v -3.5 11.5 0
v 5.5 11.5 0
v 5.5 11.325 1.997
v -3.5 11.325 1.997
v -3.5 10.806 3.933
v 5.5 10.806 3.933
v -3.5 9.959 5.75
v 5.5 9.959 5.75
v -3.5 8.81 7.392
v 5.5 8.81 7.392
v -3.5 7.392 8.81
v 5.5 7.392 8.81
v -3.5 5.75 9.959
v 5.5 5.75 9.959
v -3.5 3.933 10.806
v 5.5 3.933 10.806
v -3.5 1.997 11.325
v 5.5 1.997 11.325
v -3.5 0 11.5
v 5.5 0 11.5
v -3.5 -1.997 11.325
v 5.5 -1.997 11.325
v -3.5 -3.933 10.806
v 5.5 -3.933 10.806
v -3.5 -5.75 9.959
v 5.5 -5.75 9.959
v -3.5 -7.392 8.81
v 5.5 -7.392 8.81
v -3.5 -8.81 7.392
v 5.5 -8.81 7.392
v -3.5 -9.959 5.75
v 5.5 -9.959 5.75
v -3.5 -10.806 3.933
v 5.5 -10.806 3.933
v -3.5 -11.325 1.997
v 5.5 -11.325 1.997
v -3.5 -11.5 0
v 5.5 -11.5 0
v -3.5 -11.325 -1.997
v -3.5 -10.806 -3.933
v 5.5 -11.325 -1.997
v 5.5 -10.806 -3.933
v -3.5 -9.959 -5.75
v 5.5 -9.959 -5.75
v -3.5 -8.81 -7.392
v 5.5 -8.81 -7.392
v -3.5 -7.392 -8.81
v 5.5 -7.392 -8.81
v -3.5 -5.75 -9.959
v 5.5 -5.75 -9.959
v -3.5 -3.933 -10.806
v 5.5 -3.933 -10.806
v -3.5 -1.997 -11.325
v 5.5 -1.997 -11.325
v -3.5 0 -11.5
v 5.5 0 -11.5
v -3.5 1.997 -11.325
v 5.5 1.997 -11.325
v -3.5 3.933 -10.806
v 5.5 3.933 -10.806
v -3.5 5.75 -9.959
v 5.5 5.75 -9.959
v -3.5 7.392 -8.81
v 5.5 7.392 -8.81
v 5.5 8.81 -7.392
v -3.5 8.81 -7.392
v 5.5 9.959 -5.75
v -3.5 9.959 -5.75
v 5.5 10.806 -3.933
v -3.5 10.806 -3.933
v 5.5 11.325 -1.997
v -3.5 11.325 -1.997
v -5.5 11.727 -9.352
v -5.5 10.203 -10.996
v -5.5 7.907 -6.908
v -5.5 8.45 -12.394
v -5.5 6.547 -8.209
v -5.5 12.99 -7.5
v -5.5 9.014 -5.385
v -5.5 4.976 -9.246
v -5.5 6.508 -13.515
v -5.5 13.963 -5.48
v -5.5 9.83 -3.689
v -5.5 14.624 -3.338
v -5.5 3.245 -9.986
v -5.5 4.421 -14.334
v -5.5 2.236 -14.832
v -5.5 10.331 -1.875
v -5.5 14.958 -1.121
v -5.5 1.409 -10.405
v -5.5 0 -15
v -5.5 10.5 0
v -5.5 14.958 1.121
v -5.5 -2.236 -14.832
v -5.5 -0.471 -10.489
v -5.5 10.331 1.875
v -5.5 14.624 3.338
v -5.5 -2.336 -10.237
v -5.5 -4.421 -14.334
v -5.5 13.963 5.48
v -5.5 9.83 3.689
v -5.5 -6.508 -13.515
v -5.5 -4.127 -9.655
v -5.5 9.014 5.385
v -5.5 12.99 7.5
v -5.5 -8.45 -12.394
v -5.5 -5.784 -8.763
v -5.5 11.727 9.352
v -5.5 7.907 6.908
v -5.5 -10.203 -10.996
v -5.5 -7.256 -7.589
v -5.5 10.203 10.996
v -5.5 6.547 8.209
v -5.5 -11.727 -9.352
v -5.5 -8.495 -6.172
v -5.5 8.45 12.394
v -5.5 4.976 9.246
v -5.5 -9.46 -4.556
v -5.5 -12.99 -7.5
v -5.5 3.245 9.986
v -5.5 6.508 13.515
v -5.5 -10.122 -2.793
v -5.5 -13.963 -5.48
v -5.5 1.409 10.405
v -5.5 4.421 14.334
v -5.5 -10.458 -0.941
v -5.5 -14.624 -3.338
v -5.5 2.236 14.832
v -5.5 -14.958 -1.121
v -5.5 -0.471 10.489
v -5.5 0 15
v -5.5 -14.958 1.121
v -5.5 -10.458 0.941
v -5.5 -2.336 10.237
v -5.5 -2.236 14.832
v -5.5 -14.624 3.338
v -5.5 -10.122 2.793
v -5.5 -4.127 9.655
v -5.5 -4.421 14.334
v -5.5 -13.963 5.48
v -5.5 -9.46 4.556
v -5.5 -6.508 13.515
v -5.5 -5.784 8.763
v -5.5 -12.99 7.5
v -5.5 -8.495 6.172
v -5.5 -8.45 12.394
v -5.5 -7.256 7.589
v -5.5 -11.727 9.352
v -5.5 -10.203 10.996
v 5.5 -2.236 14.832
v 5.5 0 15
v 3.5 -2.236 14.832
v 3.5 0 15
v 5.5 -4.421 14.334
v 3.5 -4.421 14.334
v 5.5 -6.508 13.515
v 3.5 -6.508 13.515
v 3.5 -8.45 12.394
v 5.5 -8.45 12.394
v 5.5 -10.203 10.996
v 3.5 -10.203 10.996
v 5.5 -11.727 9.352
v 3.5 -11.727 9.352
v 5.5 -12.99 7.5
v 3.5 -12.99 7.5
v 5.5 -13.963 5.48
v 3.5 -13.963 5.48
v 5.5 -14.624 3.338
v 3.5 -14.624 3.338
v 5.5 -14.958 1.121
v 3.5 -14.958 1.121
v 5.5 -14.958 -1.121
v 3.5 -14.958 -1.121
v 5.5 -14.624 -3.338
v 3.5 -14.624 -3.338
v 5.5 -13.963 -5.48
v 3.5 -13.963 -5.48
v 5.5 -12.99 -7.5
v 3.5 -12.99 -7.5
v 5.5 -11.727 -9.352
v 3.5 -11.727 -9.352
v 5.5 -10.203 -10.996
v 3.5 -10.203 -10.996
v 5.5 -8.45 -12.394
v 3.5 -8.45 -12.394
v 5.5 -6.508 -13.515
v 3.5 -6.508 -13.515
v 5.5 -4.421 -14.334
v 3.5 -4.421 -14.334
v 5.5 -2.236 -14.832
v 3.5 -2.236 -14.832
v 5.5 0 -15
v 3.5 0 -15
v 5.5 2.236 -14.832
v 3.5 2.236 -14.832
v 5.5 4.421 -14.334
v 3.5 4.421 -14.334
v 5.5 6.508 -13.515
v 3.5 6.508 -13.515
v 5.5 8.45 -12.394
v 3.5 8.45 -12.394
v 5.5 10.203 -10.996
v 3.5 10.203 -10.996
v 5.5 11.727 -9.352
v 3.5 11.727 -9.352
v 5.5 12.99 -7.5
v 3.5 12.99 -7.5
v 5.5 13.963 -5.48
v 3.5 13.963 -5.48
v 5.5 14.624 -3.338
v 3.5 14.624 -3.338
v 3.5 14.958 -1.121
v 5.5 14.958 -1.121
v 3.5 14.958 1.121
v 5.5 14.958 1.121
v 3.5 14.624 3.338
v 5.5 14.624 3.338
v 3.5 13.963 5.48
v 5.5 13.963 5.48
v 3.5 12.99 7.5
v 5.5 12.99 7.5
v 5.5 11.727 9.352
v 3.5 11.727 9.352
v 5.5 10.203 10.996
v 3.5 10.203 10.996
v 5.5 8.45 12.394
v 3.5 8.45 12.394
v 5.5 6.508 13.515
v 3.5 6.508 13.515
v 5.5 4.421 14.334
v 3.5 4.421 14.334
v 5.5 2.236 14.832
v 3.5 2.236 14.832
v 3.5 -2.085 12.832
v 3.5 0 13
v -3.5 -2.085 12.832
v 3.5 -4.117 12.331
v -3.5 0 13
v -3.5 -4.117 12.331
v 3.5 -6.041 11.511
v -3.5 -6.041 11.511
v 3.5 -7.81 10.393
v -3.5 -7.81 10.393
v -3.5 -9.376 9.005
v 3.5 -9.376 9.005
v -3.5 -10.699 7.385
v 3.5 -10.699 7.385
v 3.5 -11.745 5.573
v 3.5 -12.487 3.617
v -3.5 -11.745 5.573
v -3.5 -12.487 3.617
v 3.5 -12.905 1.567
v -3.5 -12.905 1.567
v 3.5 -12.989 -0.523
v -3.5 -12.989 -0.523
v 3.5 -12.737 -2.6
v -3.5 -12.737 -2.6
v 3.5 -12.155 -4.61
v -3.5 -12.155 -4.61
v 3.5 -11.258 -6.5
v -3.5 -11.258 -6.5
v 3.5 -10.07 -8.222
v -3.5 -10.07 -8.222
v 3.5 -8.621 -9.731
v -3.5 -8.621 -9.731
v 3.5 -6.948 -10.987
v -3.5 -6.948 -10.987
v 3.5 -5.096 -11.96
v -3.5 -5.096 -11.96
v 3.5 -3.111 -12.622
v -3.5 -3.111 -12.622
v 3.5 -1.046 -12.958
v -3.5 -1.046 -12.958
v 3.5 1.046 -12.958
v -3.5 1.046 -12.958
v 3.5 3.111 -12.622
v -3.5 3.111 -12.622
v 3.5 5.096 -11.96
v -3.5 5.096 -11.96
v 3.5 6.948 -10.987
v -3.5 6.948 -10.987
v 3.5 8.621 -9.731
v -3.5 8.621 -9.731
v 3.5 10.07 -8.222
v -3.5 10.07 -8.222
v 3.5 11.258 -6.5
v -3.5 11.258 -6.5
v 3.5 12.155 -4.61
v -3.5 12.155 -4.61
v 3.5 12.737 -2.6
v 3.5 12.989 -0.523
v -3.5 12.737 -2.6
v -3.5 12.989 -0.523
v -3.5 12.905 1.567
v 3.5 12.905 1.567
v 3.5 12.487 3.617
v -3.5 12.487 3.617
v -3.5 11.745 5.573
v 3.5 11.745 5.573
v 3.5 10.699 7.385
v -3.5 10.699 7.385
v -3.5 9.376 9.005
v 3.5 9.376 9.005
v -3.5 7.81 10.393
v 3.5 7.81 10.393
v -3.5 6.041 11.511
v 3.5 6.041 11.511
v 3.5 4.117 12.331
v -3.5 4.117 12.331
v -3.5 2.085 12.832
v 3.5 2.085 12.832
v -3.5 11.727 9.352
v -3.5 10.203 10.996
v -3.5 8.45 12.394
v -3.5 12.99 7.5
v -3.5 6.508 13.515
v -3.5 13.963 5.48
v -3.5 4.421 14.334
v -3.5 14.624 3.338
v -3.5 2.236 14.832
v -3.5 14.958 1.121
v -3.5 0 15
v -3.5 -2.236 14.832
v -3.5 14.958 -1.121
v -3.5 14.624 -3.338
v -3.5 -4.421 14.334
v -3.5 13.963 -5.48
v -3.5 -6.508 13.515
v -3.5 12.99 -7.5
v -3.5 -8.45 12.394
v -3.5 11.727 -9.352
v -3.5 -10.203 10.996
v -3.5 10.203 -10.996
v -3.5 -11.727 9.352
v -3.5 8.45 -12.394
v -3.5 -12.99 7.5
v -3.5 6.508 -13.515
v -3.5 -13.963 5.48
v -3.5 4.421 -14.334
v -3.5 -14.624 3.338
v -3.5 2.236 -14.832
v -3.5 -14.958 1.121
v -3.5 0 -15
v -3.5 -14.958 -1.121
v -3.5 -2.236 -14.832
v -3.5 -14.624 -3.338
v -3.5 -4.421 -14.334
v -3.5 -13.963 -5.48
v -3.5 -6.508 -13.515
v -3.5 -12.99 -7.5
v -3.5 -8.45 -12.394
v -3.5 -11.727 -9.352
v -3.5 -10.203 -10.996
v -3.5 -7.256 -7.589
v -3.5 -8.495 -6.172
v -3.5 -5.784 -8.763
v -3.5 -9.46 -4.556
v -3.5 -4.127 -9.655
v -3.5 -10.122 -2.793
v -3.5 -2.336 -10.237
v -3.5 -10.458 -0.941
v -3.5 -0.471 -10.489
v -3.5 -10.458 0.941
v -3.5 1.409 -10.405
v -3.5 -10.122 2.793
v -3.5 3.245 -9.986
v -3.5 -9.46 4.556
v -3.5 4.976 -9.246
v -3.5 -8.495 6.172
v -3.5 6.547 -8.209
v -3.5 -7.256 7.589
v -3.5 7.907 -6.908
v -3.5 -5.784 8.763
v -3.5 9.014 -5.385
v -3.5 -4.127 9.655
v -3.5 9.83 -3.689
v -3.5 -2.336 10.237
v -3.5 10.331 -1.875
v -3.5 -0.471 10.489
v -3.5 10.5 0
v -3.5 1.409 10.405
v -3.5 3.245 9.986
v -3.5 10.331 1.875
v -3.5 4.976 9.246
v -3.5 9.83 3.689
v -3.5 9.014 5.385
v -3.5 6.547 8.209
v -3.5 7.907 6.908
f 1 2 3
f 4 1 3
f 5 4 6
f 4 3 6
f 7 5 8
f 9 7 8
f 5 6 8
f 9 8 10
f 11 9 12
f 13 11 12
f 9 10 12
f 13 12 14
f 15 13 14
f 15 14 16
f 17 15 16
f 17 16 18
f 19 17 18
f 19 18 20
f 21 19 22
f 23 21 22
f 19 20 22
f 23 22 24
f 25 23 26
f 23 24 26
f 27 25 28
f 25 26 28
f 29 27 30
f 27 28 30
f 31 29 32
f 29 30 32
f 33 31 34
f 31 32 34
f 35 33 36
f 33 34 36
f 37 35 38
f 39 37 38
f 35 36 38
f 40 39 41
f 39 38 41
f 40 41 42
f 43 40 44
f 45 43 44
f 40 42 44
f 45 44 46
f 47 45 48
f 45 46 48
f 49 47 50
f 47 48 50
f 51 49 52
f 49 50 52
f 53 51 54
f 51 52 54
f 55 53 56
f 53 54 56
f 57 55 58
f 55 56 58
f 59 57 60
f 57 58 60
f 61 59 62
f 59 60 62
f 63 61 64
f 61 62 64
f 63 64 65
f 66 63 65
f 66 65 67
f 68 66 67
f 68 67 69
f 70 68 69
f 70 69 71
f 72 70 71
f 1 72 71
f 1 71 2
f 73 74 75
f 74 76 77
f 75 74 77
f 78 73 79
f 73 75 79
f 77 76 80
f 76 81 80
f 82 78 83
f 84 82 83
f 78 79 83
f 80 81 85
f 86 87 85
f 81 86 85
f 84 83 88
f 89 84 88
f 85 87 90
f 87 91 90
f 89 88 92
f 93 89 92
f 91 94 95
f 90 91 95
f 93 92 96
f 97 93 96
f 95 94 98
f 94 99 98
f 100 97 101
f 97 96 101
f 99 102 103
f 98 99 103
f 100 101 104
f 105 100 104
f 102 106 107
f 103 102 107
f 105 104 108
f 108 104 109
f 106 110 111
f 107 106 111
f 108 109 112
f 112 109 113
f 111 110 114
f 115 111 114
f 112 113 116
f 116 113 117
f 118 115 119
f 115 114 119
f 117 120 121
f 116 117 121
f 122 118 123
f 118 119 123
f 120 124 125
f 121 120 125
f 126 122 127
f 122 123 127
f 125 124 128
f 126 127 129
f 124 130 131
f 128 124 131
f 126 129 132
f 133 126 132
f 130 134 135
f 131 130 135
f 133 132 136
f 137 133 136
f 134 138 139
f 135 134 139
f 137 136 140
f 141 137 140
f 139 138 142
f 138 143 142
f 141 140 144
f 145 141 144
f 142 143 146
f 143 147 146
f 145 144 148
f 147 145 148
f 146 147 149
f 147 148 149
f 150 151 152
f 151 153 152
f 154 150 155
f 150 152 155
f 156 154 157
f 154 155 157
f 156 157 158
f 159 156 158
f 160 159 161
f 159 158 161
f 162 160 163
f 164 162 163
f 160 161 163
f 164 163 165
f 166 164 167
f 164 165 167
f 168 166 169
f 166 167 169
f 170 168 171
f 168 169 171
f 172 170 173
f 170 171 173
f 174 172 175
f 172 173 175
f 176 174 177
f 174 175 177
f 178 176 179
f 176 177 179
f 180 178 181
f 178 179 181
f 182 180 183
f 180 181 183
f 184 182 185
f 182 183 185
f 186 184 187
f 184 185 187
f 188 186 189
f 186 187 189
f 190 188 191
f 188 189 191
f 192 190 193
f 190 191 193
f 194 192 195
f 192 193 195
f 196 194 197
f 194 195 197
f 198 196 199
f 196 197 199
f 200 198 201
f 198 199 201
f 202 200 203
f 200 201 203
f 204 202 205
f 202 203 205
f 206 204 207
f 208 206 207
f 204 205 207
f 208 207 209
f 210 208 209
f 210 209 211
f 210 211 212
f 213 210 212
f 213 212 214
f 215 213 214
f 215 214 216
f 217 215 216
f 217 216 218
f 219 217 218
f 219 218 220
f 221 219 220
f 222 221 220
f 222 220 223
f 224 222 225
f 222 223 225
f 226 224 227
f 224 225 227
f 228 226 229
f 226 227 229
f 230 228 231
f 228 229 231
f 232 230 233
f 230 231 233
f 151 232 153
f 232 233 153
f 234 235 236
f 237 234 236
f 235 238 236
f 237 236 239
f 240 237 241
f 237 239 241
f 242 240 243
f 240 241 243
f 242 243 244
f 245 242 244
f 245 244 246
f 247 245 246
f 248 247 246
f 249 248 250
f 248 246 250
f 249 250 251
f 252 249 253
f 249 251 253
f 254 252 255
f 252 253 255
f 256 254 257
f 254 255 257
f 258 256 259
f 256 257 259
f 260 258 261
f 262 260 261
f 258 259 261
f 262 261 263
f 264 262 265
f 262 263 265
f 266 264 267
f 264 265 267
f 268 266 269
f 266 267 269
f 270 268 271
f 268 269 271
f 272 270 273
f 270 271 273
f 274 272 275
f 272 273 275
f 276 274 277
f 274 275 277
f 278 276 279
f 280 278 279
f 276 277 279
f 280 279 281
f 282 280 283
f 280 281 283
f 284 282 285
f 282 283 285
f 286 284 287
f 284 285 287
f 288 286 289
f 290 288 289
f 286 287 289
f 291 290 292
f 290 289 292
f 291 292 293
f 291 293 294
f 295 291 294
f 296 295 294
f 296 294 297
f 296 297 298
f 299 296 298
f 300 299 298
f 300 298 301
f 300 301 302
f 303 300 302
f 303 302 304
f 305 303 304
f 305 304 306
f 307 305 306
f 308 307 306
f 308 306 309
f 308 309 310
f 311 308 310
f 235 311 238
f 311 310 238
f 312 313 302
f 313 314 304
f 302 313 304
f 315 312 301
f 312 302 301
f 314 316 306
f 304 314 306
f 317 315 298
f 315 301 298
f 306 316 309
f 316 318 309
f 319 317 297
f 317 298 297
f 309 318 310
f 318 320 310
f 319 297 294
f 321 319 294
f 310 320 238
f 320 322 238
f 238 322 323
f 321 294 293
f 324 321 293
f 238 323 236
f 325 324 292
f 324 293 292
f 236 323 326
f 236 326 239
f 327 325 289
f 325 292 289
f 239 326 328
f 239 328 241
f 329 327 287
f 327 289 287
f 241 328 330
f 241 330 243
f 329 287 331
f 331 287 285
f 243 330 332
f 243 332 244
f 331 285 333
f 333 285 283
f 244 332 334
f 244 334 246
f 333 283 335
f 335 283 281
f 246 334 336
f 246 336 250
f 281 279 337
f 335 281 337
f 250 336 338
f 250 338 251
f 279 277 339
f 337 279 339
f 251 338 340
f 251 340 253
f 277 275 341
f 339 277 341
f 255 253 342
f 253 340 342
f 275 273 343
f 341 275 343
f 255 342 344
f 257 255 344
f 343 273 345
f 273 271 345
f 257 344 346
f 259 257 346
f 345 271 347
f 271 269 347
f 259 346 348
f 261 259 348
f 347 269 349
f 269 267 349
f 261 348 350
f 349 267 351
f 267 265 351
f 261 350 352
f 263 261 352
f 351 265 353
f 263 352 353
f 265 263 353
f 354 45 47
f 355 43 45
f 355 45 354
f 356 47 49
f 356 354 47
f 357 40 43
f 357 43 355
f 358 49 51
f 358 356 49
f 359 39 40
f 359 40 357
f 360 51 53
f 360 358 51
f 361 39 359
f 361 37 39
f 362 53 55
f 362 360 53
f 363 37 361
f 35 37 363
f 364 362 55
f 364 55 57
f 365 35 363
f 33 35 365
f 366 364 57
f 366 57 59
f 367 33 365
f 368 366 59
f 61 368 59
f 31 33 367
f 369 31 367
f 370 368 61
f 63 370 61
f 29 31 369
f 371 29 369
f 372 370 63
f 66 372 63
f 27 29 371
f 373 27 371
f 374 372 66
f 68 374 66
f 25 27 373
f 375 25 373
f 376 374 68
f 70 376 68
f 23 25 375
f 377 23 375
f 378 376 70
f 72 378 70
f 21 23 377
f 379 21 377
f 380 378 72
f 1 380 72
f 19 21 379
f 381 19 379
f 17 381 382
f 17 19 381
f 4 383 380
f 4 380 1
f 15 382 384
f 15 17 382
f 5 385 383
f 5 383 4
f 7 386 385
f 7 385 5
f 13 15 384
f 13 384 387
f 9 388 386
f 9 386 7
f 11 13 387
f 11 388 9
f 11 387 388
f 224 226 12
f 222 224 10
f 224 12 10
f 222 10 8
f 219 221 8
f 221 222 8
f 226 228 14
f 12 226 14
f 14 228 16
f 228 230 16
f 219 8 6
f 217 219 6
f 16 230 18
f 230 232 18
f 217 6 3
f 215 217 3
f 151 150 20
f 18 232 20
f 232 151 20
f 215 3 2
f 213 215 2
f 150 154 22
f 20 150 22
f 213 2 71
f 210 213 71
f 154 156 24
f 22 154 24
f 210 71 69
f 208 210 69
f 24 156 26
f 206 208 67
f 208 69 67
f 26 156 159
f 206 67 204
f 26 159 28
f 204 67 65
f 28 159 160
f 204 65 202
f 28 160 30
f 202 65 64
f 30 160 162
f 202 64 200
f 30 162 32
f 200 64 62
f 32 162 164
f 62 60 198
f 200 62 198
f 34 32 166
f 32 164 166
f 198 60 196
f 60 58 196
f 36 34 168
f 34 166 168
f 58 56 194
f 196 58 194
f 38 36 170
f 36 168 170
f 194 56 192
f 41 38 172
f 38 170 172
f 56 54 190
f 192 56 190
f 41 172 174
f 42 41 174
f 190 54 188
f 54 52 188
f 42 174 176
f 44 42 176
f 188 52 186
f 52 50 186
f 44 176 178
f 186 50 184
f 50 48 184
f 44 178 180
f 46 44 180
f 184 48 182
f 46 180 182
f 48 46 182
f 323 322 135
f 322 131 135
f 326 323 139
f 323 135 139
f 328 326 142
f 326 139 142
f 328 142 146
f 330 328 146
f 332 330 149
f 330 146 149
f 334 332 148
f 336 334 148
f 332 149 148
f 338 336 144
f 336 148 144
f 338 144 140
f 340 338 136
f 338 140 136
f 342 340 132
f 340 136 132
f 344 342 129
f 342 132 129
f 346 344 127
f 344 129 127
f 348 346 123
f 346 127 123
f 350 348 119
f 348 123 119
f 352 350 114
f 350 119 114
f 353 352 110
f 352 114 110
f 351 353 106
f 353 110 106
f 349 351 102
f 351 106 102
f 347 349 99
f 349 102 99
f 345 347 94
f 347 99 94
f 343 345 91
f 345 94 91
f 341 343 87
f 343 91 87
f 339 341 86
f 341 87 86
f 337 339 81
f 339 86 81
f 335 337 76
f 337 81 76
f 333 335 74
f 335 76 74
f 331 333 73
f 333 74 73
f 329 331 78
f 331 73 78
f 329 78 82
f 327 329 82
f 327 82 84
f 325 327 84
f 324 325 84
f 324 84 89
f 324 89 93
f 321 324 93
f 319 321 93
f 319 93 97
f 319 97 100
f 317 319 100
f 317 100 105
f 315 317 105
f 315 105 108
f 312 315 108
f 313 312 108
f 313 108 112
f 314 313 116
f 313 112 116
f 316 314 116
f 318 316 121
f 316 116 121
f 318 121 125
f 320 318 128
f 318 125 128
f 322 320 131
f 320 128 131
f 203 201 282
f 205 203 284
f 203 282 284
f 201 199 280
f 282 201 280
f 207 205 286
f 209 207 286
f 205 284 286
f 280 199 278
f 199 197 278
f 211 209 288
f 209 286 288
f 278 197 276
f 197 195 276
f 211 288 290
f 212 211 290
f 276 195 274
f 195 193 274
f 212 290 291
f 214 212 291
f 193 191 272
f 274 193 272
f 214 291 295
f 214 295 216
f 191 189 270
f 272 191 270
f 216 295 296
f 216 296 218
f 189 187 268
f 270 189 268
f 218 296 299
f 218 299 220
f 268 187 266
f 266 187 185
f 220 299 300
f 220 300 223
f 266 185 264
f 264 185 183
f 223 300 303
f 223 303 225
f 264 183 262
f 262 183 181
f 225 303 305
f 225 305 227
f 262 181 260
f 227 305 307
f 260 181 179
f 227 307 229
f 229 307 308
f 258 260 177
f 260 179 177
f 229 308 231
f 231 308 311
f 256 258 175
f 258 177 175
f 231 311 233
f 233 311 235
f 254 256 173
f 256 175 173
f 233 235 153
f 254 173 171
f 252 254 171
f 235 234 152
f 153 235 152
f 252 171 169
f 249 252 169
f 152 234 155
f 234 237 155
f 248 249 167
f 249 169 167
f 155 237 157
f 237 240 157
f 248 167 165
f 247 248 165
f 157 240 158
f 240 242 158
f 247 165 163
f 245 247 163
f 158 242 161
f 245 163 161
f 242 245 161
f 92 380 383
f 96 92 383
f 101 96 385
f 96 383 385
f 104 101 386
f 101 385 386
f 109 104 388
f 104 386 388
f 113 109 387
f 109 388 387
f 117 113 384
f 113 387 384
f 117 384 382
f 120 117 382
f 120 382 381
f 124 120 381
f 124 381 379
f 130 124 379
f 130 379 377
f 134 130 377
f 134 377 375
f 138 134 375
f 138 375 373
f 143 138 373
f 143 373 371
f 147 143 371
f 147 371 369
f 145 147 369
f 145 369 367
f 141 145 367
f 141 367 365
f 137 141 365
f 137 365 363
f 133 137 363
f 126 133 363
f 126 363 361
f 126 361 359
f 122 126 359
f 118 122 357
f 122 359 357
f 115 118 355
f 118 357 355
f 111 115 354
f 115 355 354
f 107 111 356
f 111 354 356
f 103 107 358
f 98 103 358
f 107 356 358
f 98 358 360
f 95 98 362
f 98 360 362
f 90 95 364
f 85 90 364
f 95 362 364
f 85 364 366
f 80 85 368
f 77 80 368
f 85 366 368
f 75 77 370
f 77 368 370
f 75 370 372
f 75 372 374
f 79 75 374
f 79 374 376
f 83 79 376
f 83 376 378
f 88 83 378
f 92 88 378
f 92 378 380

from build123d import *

# Parameters (mm, degrees)
F2_R     = 10.5
F3_DEPTH = 25
F2_R_2   = 11.5
F4_DEPTH = 9


with BuildPart() as f1:
    # F0 (on Front) → F1 (revolve)
    with BuildSketch(Plane.XZ):
        Polygon((-5.5, 15), (-5.5, 0), (5.5, 0), (5.5, 15), (3.5, 15), (3.5, 13), (-3.5, 13), (-3.5, 15), align=None)
    revolve(axis=Axis((0, 0, 0), (1, 0, 0)))

    # F2 (on face) → F3 (cut)
    with BuildSketch(Plane.YZ.offset(5.5)):
        Circle(F2_R)
    extrude(amount=-F3_DEPTH, mode=Mode.SUBTRACT)

    # F2 (on face) → F4 (cut)
    with BuildSketch(Plane.YZ.offset(5.5)):
        Circle(F2_R_2)
        Circle(F2_R, mode=Mode.SUBTRACT)
    extrude(amount=-F4_DEPTH, mode=Mode.SUBTRACT)


solid = f1.part
